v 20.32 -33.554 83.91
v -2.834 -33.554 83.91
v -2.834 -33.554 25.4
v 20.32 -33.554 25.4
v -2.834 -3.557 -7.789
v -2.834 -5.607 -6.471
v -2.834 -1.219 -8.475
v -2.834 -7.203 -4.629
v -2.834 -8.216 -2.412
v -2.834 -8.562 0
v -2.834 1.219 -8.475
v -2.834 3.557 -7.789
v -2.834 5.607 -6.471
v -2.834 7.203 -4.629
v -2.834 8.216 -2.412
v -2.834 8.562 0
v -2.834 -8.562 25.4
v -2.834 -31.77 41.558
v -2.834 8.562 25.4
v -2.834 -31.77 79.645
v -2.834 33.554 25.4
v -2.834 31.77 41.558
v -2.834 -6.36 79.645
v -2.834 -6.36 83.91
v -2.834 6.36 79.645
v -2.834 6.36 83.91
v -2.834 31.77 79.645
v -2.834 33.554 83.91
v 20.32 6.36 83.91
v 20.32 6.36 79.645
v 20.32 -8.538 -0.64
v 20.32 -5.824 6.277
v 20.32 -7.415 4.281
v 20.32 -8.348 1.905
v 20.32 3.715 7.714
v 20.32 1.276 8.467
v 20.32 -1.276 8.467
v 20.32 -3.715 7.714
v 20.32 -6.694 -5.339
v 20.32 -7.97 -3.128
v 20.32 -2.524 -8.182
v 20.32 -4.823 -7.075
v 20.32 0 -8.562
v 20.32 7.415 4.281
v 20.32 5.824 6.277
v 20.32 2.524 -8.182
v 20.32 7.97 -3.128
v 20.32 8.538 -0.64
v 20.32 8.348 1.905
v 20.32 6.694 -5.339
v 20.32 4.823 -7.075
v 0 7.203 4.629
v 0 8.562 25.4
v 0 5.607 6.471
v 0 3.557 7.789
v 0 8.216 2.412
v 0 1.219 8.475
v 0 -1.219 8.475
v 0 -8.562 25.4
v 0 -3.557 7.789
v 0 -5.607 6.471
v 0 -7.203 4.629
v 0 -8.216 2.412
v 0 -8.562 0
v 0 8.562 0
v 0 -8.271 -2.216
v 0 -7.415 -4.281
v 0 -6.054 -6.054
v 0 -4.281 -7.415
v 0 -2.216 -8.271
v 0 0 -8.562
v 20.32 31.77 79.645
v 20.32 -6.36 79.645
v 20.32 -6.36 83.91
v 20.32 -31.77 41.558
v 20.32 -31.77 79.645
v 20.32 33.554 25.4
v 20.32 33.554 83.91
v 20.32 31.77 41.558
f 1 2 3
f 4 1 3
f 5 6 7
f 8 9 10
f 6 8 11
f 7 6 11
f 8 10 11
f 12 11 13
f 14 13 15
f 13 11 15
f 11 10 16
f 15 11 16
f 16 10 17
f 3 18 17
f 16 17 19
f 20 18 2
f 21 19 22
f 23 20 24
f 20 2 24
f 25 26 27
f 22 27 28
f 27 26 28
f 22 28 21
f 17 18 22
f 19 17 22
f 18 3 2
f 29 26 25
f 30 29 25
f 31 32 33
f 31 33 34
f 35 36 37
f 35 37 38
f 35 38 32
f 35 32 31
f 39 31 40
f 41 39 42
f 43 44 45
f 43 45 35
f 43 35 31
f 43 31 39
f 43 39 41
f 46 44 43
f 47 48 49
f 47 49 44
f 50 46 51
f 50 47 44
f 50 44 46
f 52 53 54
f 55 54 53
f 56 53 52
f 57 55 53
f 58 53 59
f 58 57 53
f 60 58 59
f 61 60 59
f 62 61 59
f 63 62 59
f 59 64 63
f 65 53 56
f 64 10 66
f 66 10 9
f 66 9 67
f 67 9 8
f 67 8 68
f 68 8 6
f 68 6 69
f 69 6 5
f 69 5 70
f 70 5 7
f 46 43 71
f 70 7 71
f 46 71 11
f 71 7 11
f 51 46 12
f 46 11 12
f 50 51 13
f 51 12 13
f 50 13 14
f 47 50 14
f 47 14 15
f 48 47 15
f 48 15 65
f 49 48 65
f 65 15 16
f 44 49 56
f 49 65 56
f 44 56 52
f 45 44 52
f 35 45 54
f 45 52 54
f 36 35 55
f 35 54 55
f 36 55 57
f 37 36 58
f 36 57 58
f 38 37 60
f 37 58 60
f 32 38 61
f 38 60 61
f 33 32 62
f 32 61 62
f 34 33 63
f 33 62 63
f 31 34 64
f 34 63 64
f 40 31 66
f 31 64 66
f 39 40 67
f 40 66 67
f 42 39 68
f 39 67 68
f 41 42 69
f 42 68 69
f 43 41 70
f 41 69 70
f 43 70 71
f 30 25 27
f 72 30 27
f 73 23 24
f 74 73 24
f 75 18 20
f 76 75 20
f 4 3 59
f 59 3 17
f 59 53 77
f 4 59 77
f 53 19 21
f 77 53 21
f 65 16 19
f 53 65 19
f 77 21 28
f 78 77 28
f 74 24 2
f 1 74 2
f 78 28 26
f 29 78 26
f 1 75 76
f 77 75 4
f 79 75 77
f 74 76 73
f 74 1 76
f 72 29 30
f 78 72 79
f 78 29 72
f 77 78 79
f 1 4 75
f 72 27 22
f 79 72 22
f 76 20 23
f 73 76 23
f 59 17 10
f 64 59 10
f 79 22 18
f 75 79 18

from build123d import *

# Parameters (mm, degrees)
SKETCH1_R                = 8.562349171
BOSS_EXTRUDE1_DEPTH      = 20.32
BOSS_EXTRUDE2_START      = -2.833688097
SKETCH1_5_R              = 8.562349171
BOSS_EXTRUDE2_DEPTH      = 2.833688097
BOSS_EXTRUDE3_DEPTH      = 20.32
BOSS_EXTRUDE3_DEPTH_BACK = 2.833688097


with BuildPart() as part:
    # Sketch1 → Boss-Extrude1 (new body)
    with BuildSketch(Plane.YZ):
        with Locations(Location((0, 0, 0), (0, 0, 270))):
            Circle(SKETCH1_R)
    extrude(amount=BOSS_EXTRUDE1_DEPTH)

    # Sketch1<5> → Boss-Extrude2 (add)
    with BuildSketch(Plane.YZ.offset(BOSS_EXTRUDE2_START)):
        with Locations(Location((0, 0, 0), (0, 0, 180))):
            Circle(SKETCH1_5_R)
        with BuildLine():
            Line((8.562349171, 25.4), (-8.562349171, 25.4))
            Line((-8.562349171, 25.4), (-8.562349171, 0))
            ThreePointArc((-8.562349171, 0), (0, 8.562349171), (8.562349171, 0))
            Line((8.562349171, 0), (8.562349171, 25.4))
        make_face()
    extrude(amount=BOSS_EXTRUDE2_DEPTH)

    # Sketch1<6> → Boss-Extrude3 (add, two sides: drawn at the far end of the back side and taken through both)
    with BuildSketch(Plane.YZ.offset(-BOSS_EXTRUDE3_DEPTH_BACK)):
        Polygon((-33.554191153, 25.4), (-8.562349171, 25.4), (8.562349171, 25.4), (33.554191153, 25.4), (33.554191153, 83.9097483), (6.36016, 83.9097483), (6.36016, 79.644886138), (31.77032, 79.644886138), (31.77032, 41.557586138), (-31.77032, 41.557586138), (-31.77032, 79.644886138), (-6.36016, 79.644886138), (-6.36016, 83.9097483), (-33.554191153, 83.9097483), align=None)
    extrude(amount=BOSS_EXTRUDE3_DEPTH + BOSS_EXTRUDE3_DEPTH_BACK)


solid = part.part
